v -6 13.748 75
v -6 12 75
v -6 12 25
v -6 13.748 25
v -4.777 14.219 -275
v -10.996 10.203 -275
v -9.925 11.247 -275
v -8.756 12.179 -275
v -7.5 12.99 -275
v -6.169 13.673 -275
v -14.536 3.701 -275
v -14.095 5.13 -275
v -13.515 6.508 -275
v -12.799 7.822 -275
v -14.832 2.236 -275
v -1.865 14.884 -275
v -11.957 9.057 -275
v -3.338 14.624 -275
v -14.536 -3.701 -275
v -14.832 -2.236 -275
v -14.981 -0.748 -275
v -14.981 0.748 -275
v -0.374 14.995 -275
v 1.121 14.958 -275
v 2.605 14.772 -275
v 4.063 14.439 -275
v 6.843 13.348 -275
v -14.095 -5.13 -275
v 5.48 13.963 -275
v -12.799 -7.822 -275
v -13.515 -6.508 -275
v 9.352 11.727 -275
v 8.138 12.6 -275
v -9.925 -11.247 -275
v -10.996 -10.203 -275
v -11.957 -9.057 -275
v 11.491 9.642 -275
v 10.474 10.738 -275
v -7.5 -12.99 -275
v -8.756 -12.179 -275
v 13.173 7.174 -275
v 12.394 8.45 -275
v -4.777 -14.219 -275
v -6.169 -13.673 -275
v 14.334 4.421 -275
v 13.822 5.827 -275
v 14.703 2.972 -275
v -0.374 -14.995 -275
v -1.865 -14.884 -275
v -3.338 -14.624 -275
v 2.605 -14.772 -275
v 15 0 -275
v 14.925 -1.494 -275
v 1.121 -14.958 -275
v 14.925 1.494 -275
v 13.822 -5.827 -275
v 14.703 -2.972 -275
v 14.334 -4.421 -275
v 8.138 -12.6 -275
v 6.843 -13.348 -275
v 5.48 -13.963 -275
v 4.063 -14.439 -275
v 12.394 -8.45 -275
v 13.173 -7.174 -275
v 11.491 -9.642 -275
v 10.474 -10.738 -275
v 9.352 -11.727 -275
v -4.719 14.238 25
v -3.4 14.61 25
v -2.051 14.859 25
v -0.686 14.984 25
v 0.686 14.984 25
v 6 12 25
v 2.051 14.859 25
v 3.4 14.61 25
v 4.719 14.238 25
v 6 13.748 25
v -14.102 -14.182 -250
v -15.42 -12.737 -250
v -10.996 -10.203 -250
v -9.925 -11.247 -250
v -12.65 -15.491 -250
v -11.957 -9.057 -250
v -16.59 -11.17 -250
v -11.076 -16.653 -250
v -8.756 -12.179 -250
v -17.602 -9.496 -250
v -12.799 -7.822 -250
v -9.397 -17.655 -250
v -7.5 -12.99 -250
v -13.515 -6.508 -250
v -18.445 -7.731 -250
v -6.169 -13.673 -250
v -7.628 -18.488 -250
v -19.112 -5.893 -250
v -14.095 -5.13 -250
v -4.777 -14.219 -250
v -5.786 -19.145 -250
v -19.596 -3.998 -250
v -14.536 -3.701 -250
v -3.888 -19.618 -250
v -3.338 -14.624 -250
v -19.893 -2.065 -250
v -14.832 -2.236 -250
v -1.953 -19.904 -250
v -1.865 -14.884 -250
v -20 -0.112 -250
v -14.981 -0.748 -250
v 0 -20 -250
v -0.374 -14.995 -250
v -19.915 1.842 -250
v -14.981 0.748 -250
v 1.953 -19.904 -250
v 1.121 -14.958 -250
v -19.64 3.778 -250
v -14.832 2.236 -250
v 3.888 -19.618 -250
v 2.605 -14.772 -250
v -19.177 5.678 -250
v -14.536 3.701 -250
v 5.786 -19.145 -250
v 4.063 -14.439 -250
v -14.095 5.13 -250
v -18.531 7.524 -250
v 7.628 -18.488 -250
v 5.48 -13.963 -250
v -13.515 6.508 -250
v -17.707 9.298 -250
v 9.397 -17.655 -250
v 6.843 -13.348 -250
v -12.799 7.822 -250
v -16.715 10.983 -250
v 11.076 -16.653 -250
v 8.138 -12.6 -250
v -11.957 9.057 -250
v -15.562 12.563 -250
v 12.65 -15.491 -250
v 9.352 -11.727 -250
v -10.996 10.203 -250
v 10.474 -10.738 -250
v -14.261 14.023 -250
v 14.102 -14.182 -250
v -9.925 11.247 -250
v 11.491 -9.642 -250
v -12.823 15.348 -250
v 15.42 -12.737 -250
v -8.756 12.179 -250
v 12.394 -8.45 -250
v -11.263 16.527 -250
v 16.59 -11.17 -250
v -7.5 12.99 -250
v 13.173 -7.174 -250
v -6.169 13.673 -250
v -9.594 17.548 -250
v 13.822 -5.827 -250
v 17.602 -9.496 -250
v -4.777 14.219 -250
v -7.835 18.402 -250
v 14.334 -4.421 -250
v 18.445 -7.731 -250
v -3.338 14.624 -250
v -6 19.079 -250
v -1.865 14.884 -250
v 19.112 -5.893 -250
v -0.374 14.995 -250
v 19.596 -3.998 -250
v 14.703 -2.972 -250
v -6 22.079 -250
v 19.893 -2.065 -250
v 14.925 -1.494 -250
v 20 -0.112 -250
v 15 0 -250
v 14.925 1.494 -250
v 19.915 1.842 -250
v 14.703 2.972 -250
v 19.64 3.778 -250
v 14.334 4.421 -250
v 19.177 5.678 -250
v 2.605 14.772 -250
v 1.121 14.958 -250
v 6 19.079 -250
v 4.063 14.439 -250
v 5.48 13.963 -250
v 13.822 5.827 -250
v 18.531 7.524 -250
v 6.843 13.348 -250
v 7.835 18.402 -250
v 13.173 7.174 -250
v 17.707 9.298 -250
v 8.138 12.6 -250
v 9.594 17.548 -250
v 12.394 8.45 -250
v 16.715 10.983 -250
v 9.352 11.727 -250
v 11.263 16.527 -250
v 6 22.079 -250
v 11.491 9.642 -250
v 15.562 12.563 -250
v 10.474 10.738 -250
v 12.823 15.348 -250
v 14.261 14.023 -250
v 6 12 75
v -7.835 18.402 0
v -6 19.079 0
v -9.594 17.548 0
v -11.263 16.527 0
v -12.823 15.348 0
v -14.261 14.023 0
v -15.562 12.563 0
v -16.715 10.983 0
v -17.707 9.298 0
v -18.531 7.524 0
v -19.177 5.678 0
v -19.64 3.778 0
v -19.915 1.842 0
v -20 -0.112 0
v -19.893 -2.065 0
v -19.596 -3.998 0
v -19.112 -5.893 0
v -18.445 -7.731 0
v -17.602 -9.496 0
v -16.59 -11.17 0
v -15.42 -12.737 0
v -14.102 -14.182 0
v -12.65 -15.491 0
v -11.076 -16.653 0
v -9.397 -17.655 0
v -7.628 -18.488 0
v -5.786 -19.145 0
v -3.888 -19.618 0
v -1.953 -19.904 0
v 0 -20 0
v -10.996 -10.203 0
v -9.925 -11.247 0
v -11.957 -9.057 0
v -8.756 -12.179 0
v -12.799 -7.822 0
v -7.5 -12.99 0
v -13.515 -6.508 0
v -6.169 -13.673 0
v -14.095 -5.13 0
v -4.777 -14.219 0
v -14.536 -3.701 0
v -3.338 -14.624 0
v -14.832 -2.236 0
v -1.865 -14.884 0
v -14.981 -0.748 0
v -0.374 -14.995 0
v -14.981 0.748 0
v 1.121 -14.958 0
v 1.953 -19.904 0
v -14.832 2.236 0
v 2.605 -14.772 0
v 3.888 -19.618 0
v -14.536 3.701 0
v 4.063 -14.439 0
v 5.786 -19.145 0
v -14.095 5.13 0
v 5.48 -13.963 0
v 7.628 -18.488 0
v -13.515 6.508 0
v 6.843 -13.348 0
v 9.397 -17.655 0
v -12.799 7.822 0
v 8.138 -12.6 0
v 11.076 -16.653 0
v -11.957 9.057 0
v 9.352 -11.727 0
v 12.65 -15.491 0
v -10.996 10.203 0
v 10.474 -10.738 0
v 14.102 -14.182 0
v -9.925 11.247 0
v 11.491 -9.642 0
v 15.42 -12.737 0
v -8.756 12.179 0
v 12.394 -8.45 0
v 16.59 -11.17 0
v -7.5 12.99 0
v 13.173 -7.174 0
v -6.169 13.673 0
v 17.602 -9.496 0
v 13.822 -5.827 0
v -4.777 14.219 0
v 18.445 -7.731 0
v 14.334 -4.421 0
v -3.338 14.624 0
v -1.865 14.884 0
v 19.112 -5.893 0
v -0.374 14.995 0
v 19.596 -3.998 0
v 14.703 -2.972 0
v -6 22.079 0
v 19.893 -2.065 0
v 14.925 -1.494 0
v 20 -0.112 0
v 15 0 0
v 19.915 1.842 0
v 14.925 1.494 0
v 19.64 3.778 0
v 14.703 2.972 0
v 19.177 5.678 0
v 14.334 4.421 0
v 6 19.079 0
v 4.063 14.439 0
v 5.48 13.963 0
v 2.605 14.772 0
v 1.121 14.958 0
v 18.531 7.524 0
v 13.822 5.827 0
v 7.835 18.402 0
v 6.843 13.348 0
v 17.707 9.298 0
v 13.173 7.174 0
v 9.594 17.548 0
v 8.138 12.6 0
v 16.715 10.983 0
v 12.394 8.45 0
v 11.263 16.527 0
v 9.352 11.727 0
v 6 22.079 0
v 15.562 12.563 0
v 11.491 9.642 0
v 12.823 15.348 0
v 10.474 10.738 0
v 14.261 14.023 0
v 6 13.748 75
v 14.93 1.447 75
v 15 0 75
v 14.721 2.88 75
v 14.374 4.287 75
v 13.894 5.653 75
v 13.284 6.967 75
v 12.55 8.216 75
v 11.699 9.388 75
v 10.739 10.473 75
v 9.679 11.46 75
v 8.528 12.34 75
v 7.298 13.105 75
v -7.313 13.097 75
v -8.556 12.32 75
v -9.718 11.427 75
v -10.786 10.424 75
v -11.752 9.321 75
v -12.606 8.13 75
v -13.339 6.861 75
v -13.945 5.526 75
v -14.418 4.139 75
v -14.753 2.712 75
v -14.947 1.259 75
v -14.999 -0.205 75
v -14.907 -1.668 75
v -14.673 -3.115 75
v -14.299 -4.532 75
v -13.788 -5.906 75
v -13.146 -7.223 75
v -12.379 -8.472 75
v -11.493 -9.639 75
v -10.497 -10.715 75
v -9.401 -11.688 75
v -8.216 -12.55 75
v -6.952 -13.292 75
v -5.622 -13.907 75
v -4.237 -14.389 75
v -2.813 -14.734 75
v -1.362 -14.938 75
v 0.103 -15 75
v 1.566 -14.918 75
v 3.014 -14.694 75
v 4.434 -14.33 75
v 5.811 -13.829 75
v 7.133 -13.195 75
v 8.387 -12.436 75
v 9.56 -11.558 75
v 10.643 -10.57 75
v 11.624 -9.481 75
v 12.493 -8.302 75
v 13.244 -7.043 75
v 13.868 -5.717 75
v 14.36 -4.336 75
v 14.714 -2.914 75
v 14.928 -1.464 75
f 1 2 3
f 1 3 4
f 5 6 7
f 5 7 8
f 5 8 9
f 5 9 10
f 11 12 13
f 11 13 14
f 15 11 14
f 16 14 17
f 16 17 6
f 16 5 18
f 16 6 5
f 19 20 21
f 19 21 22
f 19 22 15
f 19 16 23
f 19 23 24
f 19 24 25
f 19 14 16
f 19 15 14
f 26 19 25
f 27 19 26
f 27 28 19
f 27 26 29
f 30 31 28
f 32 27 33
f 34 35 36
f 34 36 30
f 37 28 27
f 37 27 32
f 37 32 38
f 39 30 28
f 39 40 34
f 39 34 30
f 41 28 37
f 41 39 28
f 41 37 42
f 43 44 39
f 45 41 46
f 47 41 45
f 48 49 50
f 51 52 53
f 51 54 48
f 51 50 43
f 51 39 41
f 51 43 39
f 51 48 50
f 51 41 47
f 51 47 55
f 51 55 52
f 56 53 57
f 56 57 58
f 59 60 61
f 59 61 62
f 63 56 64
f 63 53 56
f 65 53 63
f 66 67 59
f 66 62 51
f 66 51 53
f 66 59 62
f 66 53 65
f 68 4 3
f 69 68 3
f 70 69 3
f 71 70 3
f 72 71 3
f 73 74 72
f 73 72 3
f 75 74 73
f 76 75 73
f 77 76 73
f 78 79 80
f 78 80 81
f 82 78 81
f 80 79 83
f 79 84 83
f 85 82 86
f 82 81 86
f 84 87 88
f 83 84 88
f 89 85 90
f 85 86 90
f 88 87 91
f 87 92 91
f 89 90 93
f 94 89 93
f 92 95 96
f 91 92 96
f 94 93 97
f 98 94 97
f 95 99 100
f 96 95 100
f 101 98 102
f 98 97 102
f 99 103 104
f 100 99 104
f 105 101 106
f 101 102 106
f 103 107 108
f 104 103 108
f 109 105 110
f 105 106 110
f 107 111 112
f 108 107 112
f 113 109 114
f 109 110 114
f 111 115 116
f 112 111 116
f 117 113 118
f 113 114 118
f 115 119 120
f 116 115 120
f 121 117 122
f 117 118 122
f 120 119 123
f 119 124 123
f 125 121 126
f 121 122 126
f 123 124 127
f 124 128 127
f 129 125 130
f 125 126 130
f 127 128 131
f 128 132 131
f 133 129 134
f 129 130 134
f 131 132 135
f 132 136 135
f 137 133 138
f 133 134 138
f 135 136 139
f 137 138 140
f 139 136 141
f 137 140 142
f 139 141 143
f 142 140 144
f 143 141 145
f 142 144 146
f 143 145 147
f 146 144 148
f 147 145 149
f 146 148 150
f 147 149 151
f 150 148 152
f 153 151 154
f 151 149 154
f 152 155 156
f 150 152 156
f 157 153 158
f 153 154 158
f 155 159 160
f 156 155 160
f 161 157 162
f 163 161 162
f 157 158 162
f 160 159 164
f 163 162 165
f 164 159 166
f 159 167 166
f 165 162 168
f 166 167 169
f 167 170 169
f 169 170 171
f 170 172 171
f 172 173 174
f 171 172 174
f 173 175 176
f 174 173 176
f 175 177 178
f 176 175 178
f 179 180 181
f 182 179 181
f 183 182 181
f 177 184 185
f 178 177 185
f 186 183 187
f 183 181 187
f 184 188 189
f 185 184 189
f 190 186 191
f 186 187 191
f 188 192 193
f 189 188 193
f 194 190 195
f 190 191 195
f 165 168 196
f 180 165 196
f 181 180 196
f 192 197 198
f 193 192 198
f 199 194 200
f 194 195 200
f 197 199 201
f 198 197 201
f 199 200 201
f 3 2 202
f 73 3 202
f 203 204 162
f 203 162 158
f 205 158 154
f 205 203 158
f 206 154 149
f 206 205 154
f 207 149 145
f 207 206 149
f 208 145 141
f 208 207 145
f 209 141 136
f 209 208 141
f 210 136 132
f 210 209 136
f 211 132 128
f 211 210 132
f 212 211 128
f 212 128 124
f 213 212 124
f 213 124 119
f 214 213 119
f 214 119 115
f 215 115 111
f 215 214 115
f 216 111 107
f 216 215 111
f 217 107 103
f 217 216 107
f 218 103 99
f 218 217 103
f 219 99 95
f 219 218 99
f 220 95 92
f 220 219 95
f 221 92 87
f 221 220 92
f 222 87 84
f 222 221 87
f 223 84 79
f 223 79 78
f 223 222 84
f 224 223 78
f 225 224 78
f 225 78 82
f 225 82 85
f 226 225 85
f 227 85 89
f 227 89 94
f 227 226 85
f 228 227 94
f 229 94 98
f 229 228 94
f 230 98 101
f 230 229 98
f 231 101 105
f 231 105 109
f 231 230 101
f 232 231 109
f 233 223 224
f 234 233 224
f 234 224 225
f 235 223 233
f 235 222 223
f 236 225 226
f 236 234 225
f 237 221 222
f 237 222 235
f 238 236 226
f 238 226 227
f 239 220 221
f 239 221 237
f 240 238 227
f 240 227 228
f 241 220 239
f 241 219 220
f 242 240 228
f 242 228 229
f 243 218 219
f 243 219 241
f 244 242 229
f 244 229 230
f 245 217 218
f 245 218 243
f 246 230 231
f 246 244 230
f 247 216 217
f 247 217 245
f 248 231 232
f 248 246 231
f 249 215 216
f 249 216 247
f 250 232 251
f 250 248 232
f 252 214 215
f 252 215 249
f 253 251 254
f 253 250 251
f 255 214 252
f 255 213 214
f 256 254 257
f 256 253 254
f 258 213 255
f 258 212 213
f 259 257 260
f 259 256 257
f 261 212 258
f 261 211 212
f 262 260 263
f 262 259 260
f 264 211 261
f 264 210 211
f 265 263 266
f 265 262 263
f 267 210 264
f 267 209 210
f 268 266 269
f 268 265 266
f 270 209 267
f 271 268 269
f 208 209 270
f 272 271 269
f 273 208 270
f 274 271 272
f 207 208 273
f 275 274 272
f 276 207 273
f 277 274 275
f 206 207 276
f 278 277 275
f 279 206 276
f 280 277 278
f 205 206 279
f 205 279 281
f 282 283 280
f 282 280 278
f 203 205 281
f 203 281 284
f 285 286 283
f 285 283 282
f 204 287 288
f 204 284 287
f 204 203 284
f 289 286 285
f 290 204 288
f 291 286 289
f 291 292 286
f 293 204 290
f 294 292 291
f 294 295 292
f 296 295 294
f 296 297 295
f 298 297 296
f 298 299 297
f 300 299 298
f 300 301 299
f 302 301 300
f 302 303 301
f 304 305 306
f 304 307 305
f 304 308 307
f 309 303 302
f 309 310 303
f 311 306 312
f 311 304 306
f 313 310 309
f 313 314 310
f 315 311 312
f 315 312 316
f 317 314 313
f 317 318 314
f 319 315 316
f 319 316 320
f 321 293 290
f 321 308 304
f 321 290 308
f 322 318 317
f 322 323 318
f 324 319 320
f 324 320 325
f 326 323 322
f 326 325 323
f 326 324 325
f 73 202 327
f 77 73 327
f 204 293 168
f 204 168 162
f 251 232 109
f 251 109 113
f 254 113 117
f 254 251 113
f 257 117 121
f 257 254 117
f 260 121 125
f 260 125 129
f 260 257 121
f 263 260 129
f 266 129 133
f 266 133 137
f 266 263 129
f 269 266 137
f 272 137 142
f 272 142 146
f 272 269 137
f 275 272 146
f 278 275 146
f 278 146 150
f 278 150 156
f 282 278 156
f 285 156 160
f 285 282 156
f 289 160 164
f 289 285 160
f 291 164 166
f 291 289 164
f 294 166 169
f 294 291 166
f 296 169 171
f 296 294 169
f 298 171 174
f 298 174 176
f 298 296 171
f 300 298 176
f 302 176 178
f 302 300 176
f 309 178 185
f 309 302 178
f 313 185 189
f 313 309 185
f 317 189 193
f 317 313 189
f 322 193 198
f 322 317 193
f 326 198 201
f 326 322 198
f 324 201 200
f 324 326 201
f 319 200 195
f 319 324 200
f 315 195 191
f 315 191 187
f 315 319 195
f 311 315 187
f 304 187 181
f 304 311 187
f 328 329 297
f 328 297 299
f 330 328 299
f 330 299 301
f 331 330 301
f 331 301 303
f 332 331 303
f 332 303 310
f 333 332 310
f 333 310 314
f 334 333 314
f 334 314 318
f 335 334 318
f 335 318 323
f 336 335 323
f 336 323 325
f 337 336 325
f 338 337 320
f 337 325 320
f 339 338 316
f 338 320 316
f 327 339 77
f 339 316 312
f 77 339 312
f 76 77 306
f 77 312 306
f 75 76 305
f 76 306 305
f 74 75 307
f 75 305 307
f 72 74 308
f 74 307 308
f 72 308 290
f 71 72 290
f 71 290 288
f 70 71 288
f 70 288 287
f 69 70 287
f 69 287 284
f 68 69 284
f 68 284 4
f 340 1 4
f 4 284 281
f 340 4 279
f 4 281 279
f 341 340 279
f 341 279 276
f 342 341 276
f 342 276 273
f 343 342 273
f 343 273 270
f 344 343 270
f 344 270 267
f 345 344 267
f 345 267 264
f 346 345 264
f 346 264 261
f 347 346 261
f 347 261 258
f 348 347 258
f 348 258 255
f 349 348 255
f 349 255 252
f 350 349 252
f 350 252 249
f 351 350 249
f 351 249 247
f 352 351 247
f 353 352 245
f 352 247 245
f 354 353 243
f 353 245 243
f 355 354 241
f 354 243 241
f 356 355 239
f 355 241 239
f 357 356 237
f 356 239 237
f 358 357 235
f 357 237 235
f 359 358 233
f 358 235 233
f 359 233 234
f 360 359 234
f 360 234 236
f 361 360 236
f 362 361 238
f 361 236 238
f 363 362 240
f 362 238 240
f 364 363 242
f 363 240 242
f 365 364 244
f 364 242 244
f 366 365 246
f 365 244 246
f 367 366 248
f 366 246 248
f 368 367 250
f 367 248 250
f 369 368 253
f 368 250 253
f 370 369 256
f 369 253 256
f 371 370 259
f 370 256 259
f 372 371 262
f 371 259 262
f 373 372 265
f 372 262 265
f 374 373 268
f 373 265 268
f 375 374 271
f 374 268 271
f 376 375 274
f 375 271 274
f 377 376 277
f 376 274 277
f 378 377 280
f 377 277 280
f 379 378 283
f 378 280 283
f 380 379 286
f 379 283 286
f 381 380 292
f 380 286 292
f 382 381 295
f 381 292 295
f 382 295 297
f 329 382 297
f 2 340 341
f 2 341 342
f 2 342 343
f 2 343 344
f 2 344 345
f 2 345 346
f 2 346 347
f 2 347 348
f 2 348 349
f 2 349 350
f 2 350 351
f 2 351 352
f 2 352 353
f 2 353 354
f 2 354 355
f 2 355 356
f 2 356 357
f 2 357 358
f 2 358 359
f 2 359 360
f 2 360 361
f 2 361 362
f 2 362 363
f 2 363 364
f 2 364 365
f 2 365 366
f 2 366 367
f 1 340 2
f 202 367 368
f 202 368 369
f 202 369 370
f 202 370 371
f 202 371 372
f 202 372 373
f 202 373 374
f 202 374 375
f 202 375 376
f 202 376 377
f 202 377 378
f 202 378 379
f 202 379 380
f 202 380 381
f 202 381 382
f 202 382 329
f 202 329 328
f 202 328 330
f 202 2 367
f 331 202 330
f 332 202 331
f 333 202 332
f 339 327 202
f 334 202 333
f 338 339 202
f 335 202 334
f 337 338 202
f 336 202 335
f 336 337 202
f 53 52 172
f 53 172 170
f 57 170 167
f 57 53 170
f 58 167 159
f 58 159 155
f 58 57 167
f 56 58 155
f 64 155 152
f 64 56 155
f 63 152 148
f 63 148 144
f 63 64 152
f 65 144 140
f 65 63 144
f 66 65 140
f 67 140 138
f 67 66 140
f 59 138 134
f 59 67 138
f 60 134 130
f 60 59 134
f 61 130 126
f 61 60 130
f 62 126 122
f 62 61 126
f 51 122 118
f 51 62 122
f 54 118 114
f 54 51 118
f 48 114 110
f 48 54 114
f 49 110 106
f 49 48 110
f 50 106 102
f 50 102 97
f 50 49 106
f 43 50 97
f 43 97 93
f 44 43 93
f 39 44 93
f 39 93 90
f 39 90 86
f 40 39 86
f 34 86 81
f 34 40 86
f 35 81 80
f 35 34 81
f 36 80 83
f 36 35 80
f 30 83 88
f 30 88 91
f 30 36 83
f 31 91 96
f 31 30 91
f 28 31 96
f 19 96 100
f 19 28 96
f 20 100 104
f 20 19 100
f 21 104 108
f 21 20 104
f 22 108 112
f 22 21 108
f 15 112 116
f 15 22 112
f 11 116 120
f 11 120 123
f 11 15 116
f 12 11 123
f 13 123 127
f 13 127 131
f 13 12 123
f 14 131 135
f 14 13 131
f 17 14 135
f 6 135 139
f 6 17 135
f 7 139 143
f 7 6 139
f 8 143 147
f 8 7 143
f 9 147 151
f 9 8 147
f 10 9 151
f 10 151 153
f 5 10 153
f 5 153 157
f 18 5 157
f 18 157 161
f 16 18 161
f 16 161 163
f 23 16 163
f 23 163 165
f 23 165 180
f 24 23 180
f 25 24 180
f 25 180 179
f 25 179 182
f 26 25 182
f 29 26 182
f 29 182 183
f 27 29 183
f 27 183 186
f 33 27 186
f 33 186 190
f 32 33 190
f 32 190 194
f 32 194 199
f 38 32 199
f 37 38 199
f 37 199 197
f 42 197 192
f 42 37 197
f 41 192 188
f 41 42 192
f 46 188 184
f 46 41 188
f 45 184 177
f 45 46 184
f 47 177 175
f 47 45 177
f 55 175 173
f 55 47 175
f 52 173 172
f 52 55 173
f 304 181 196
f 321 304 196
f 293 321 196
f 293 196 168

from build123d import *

# Parameters (mm, degrees)
BOSS_EXTRUDE1_DEPTH = 250
SKETCH2_R           = 15
BOSS_EXTRUDE2_DEPTH = 75
BOSS_EXTRUDE3_START = 25
SKETCH3_R           = 15
BOSS_EXTRUDE3_DEPTH = 25
SKETCH4_W           = 12
SKETCH4_H           = 6
CUT_EXTRUDE1_DEPTH  = 50


with BuildPart() as part:
    # Sketch1 → Boss-Extrude1 (new body)
    with BuildSketch(Plane.XY):
        with BuildLine():
            ThreePointArc((0, -20), (19.76835465, -3.035153115), (5.999998319, 19.078784557))
            Line((5.999998319, 19.078784557), (5.999998378, 22.078784557))
            Line((5.999998378, 22.078784557), (0, 22.078784557))
            Line((0, 22.078784557), (0, -20))
        make_face()
        with BuildLine():
            ThreePointArc((-6.000001681, 19.0787835), (-19.768354383, -3.035154857), (0, -20))
            Line((0, -20), (0, 22.078784557))
            Line((0, 22.078784557), (-6.000001622, 22.078784557))
            Line((-6.000001622, 22.078784557), (-6.000001681, 19.0787835))
        make_face()
    extrude(amount=-BOSS_EXTRUDE1_DEPTH)

    # Sketch2 → Boss-Extrude2 (add)
    with BuildSketch(Plane.XY):
        Circle(SKETCH2_R)
    extrude(amount=BOSS_EXTRUDE2_DEPTH)

    # Sketch3 → Boss-Extrude3 (add)
    with BuildSketch(Plane(origin=(0, 0, -250), x_dir=(-1, 0, 0), z_dir=(0, 0, -1)).offset(BOSS_EXTRUDE3_START)):
        with Locations(Location((0, 0, 0), (0, 0, 180))):
            Circle(SKETCH3_R)
    extrude(amount=-BOSS_EXTRUDE3_DEPTH)

    # Sketch4 → Cut-Extrude1 (cut)
    with BuildSketch(Plane.XY.offset(75)):
        with Locations((0, 15)):
            Rectangle(SKETCH4_W, SKETCH4_H)
    extrude(amount=-CUT_EXTRUDE1_DEPTH, mode=Mode.SUBTRACT)


solid = part.part
